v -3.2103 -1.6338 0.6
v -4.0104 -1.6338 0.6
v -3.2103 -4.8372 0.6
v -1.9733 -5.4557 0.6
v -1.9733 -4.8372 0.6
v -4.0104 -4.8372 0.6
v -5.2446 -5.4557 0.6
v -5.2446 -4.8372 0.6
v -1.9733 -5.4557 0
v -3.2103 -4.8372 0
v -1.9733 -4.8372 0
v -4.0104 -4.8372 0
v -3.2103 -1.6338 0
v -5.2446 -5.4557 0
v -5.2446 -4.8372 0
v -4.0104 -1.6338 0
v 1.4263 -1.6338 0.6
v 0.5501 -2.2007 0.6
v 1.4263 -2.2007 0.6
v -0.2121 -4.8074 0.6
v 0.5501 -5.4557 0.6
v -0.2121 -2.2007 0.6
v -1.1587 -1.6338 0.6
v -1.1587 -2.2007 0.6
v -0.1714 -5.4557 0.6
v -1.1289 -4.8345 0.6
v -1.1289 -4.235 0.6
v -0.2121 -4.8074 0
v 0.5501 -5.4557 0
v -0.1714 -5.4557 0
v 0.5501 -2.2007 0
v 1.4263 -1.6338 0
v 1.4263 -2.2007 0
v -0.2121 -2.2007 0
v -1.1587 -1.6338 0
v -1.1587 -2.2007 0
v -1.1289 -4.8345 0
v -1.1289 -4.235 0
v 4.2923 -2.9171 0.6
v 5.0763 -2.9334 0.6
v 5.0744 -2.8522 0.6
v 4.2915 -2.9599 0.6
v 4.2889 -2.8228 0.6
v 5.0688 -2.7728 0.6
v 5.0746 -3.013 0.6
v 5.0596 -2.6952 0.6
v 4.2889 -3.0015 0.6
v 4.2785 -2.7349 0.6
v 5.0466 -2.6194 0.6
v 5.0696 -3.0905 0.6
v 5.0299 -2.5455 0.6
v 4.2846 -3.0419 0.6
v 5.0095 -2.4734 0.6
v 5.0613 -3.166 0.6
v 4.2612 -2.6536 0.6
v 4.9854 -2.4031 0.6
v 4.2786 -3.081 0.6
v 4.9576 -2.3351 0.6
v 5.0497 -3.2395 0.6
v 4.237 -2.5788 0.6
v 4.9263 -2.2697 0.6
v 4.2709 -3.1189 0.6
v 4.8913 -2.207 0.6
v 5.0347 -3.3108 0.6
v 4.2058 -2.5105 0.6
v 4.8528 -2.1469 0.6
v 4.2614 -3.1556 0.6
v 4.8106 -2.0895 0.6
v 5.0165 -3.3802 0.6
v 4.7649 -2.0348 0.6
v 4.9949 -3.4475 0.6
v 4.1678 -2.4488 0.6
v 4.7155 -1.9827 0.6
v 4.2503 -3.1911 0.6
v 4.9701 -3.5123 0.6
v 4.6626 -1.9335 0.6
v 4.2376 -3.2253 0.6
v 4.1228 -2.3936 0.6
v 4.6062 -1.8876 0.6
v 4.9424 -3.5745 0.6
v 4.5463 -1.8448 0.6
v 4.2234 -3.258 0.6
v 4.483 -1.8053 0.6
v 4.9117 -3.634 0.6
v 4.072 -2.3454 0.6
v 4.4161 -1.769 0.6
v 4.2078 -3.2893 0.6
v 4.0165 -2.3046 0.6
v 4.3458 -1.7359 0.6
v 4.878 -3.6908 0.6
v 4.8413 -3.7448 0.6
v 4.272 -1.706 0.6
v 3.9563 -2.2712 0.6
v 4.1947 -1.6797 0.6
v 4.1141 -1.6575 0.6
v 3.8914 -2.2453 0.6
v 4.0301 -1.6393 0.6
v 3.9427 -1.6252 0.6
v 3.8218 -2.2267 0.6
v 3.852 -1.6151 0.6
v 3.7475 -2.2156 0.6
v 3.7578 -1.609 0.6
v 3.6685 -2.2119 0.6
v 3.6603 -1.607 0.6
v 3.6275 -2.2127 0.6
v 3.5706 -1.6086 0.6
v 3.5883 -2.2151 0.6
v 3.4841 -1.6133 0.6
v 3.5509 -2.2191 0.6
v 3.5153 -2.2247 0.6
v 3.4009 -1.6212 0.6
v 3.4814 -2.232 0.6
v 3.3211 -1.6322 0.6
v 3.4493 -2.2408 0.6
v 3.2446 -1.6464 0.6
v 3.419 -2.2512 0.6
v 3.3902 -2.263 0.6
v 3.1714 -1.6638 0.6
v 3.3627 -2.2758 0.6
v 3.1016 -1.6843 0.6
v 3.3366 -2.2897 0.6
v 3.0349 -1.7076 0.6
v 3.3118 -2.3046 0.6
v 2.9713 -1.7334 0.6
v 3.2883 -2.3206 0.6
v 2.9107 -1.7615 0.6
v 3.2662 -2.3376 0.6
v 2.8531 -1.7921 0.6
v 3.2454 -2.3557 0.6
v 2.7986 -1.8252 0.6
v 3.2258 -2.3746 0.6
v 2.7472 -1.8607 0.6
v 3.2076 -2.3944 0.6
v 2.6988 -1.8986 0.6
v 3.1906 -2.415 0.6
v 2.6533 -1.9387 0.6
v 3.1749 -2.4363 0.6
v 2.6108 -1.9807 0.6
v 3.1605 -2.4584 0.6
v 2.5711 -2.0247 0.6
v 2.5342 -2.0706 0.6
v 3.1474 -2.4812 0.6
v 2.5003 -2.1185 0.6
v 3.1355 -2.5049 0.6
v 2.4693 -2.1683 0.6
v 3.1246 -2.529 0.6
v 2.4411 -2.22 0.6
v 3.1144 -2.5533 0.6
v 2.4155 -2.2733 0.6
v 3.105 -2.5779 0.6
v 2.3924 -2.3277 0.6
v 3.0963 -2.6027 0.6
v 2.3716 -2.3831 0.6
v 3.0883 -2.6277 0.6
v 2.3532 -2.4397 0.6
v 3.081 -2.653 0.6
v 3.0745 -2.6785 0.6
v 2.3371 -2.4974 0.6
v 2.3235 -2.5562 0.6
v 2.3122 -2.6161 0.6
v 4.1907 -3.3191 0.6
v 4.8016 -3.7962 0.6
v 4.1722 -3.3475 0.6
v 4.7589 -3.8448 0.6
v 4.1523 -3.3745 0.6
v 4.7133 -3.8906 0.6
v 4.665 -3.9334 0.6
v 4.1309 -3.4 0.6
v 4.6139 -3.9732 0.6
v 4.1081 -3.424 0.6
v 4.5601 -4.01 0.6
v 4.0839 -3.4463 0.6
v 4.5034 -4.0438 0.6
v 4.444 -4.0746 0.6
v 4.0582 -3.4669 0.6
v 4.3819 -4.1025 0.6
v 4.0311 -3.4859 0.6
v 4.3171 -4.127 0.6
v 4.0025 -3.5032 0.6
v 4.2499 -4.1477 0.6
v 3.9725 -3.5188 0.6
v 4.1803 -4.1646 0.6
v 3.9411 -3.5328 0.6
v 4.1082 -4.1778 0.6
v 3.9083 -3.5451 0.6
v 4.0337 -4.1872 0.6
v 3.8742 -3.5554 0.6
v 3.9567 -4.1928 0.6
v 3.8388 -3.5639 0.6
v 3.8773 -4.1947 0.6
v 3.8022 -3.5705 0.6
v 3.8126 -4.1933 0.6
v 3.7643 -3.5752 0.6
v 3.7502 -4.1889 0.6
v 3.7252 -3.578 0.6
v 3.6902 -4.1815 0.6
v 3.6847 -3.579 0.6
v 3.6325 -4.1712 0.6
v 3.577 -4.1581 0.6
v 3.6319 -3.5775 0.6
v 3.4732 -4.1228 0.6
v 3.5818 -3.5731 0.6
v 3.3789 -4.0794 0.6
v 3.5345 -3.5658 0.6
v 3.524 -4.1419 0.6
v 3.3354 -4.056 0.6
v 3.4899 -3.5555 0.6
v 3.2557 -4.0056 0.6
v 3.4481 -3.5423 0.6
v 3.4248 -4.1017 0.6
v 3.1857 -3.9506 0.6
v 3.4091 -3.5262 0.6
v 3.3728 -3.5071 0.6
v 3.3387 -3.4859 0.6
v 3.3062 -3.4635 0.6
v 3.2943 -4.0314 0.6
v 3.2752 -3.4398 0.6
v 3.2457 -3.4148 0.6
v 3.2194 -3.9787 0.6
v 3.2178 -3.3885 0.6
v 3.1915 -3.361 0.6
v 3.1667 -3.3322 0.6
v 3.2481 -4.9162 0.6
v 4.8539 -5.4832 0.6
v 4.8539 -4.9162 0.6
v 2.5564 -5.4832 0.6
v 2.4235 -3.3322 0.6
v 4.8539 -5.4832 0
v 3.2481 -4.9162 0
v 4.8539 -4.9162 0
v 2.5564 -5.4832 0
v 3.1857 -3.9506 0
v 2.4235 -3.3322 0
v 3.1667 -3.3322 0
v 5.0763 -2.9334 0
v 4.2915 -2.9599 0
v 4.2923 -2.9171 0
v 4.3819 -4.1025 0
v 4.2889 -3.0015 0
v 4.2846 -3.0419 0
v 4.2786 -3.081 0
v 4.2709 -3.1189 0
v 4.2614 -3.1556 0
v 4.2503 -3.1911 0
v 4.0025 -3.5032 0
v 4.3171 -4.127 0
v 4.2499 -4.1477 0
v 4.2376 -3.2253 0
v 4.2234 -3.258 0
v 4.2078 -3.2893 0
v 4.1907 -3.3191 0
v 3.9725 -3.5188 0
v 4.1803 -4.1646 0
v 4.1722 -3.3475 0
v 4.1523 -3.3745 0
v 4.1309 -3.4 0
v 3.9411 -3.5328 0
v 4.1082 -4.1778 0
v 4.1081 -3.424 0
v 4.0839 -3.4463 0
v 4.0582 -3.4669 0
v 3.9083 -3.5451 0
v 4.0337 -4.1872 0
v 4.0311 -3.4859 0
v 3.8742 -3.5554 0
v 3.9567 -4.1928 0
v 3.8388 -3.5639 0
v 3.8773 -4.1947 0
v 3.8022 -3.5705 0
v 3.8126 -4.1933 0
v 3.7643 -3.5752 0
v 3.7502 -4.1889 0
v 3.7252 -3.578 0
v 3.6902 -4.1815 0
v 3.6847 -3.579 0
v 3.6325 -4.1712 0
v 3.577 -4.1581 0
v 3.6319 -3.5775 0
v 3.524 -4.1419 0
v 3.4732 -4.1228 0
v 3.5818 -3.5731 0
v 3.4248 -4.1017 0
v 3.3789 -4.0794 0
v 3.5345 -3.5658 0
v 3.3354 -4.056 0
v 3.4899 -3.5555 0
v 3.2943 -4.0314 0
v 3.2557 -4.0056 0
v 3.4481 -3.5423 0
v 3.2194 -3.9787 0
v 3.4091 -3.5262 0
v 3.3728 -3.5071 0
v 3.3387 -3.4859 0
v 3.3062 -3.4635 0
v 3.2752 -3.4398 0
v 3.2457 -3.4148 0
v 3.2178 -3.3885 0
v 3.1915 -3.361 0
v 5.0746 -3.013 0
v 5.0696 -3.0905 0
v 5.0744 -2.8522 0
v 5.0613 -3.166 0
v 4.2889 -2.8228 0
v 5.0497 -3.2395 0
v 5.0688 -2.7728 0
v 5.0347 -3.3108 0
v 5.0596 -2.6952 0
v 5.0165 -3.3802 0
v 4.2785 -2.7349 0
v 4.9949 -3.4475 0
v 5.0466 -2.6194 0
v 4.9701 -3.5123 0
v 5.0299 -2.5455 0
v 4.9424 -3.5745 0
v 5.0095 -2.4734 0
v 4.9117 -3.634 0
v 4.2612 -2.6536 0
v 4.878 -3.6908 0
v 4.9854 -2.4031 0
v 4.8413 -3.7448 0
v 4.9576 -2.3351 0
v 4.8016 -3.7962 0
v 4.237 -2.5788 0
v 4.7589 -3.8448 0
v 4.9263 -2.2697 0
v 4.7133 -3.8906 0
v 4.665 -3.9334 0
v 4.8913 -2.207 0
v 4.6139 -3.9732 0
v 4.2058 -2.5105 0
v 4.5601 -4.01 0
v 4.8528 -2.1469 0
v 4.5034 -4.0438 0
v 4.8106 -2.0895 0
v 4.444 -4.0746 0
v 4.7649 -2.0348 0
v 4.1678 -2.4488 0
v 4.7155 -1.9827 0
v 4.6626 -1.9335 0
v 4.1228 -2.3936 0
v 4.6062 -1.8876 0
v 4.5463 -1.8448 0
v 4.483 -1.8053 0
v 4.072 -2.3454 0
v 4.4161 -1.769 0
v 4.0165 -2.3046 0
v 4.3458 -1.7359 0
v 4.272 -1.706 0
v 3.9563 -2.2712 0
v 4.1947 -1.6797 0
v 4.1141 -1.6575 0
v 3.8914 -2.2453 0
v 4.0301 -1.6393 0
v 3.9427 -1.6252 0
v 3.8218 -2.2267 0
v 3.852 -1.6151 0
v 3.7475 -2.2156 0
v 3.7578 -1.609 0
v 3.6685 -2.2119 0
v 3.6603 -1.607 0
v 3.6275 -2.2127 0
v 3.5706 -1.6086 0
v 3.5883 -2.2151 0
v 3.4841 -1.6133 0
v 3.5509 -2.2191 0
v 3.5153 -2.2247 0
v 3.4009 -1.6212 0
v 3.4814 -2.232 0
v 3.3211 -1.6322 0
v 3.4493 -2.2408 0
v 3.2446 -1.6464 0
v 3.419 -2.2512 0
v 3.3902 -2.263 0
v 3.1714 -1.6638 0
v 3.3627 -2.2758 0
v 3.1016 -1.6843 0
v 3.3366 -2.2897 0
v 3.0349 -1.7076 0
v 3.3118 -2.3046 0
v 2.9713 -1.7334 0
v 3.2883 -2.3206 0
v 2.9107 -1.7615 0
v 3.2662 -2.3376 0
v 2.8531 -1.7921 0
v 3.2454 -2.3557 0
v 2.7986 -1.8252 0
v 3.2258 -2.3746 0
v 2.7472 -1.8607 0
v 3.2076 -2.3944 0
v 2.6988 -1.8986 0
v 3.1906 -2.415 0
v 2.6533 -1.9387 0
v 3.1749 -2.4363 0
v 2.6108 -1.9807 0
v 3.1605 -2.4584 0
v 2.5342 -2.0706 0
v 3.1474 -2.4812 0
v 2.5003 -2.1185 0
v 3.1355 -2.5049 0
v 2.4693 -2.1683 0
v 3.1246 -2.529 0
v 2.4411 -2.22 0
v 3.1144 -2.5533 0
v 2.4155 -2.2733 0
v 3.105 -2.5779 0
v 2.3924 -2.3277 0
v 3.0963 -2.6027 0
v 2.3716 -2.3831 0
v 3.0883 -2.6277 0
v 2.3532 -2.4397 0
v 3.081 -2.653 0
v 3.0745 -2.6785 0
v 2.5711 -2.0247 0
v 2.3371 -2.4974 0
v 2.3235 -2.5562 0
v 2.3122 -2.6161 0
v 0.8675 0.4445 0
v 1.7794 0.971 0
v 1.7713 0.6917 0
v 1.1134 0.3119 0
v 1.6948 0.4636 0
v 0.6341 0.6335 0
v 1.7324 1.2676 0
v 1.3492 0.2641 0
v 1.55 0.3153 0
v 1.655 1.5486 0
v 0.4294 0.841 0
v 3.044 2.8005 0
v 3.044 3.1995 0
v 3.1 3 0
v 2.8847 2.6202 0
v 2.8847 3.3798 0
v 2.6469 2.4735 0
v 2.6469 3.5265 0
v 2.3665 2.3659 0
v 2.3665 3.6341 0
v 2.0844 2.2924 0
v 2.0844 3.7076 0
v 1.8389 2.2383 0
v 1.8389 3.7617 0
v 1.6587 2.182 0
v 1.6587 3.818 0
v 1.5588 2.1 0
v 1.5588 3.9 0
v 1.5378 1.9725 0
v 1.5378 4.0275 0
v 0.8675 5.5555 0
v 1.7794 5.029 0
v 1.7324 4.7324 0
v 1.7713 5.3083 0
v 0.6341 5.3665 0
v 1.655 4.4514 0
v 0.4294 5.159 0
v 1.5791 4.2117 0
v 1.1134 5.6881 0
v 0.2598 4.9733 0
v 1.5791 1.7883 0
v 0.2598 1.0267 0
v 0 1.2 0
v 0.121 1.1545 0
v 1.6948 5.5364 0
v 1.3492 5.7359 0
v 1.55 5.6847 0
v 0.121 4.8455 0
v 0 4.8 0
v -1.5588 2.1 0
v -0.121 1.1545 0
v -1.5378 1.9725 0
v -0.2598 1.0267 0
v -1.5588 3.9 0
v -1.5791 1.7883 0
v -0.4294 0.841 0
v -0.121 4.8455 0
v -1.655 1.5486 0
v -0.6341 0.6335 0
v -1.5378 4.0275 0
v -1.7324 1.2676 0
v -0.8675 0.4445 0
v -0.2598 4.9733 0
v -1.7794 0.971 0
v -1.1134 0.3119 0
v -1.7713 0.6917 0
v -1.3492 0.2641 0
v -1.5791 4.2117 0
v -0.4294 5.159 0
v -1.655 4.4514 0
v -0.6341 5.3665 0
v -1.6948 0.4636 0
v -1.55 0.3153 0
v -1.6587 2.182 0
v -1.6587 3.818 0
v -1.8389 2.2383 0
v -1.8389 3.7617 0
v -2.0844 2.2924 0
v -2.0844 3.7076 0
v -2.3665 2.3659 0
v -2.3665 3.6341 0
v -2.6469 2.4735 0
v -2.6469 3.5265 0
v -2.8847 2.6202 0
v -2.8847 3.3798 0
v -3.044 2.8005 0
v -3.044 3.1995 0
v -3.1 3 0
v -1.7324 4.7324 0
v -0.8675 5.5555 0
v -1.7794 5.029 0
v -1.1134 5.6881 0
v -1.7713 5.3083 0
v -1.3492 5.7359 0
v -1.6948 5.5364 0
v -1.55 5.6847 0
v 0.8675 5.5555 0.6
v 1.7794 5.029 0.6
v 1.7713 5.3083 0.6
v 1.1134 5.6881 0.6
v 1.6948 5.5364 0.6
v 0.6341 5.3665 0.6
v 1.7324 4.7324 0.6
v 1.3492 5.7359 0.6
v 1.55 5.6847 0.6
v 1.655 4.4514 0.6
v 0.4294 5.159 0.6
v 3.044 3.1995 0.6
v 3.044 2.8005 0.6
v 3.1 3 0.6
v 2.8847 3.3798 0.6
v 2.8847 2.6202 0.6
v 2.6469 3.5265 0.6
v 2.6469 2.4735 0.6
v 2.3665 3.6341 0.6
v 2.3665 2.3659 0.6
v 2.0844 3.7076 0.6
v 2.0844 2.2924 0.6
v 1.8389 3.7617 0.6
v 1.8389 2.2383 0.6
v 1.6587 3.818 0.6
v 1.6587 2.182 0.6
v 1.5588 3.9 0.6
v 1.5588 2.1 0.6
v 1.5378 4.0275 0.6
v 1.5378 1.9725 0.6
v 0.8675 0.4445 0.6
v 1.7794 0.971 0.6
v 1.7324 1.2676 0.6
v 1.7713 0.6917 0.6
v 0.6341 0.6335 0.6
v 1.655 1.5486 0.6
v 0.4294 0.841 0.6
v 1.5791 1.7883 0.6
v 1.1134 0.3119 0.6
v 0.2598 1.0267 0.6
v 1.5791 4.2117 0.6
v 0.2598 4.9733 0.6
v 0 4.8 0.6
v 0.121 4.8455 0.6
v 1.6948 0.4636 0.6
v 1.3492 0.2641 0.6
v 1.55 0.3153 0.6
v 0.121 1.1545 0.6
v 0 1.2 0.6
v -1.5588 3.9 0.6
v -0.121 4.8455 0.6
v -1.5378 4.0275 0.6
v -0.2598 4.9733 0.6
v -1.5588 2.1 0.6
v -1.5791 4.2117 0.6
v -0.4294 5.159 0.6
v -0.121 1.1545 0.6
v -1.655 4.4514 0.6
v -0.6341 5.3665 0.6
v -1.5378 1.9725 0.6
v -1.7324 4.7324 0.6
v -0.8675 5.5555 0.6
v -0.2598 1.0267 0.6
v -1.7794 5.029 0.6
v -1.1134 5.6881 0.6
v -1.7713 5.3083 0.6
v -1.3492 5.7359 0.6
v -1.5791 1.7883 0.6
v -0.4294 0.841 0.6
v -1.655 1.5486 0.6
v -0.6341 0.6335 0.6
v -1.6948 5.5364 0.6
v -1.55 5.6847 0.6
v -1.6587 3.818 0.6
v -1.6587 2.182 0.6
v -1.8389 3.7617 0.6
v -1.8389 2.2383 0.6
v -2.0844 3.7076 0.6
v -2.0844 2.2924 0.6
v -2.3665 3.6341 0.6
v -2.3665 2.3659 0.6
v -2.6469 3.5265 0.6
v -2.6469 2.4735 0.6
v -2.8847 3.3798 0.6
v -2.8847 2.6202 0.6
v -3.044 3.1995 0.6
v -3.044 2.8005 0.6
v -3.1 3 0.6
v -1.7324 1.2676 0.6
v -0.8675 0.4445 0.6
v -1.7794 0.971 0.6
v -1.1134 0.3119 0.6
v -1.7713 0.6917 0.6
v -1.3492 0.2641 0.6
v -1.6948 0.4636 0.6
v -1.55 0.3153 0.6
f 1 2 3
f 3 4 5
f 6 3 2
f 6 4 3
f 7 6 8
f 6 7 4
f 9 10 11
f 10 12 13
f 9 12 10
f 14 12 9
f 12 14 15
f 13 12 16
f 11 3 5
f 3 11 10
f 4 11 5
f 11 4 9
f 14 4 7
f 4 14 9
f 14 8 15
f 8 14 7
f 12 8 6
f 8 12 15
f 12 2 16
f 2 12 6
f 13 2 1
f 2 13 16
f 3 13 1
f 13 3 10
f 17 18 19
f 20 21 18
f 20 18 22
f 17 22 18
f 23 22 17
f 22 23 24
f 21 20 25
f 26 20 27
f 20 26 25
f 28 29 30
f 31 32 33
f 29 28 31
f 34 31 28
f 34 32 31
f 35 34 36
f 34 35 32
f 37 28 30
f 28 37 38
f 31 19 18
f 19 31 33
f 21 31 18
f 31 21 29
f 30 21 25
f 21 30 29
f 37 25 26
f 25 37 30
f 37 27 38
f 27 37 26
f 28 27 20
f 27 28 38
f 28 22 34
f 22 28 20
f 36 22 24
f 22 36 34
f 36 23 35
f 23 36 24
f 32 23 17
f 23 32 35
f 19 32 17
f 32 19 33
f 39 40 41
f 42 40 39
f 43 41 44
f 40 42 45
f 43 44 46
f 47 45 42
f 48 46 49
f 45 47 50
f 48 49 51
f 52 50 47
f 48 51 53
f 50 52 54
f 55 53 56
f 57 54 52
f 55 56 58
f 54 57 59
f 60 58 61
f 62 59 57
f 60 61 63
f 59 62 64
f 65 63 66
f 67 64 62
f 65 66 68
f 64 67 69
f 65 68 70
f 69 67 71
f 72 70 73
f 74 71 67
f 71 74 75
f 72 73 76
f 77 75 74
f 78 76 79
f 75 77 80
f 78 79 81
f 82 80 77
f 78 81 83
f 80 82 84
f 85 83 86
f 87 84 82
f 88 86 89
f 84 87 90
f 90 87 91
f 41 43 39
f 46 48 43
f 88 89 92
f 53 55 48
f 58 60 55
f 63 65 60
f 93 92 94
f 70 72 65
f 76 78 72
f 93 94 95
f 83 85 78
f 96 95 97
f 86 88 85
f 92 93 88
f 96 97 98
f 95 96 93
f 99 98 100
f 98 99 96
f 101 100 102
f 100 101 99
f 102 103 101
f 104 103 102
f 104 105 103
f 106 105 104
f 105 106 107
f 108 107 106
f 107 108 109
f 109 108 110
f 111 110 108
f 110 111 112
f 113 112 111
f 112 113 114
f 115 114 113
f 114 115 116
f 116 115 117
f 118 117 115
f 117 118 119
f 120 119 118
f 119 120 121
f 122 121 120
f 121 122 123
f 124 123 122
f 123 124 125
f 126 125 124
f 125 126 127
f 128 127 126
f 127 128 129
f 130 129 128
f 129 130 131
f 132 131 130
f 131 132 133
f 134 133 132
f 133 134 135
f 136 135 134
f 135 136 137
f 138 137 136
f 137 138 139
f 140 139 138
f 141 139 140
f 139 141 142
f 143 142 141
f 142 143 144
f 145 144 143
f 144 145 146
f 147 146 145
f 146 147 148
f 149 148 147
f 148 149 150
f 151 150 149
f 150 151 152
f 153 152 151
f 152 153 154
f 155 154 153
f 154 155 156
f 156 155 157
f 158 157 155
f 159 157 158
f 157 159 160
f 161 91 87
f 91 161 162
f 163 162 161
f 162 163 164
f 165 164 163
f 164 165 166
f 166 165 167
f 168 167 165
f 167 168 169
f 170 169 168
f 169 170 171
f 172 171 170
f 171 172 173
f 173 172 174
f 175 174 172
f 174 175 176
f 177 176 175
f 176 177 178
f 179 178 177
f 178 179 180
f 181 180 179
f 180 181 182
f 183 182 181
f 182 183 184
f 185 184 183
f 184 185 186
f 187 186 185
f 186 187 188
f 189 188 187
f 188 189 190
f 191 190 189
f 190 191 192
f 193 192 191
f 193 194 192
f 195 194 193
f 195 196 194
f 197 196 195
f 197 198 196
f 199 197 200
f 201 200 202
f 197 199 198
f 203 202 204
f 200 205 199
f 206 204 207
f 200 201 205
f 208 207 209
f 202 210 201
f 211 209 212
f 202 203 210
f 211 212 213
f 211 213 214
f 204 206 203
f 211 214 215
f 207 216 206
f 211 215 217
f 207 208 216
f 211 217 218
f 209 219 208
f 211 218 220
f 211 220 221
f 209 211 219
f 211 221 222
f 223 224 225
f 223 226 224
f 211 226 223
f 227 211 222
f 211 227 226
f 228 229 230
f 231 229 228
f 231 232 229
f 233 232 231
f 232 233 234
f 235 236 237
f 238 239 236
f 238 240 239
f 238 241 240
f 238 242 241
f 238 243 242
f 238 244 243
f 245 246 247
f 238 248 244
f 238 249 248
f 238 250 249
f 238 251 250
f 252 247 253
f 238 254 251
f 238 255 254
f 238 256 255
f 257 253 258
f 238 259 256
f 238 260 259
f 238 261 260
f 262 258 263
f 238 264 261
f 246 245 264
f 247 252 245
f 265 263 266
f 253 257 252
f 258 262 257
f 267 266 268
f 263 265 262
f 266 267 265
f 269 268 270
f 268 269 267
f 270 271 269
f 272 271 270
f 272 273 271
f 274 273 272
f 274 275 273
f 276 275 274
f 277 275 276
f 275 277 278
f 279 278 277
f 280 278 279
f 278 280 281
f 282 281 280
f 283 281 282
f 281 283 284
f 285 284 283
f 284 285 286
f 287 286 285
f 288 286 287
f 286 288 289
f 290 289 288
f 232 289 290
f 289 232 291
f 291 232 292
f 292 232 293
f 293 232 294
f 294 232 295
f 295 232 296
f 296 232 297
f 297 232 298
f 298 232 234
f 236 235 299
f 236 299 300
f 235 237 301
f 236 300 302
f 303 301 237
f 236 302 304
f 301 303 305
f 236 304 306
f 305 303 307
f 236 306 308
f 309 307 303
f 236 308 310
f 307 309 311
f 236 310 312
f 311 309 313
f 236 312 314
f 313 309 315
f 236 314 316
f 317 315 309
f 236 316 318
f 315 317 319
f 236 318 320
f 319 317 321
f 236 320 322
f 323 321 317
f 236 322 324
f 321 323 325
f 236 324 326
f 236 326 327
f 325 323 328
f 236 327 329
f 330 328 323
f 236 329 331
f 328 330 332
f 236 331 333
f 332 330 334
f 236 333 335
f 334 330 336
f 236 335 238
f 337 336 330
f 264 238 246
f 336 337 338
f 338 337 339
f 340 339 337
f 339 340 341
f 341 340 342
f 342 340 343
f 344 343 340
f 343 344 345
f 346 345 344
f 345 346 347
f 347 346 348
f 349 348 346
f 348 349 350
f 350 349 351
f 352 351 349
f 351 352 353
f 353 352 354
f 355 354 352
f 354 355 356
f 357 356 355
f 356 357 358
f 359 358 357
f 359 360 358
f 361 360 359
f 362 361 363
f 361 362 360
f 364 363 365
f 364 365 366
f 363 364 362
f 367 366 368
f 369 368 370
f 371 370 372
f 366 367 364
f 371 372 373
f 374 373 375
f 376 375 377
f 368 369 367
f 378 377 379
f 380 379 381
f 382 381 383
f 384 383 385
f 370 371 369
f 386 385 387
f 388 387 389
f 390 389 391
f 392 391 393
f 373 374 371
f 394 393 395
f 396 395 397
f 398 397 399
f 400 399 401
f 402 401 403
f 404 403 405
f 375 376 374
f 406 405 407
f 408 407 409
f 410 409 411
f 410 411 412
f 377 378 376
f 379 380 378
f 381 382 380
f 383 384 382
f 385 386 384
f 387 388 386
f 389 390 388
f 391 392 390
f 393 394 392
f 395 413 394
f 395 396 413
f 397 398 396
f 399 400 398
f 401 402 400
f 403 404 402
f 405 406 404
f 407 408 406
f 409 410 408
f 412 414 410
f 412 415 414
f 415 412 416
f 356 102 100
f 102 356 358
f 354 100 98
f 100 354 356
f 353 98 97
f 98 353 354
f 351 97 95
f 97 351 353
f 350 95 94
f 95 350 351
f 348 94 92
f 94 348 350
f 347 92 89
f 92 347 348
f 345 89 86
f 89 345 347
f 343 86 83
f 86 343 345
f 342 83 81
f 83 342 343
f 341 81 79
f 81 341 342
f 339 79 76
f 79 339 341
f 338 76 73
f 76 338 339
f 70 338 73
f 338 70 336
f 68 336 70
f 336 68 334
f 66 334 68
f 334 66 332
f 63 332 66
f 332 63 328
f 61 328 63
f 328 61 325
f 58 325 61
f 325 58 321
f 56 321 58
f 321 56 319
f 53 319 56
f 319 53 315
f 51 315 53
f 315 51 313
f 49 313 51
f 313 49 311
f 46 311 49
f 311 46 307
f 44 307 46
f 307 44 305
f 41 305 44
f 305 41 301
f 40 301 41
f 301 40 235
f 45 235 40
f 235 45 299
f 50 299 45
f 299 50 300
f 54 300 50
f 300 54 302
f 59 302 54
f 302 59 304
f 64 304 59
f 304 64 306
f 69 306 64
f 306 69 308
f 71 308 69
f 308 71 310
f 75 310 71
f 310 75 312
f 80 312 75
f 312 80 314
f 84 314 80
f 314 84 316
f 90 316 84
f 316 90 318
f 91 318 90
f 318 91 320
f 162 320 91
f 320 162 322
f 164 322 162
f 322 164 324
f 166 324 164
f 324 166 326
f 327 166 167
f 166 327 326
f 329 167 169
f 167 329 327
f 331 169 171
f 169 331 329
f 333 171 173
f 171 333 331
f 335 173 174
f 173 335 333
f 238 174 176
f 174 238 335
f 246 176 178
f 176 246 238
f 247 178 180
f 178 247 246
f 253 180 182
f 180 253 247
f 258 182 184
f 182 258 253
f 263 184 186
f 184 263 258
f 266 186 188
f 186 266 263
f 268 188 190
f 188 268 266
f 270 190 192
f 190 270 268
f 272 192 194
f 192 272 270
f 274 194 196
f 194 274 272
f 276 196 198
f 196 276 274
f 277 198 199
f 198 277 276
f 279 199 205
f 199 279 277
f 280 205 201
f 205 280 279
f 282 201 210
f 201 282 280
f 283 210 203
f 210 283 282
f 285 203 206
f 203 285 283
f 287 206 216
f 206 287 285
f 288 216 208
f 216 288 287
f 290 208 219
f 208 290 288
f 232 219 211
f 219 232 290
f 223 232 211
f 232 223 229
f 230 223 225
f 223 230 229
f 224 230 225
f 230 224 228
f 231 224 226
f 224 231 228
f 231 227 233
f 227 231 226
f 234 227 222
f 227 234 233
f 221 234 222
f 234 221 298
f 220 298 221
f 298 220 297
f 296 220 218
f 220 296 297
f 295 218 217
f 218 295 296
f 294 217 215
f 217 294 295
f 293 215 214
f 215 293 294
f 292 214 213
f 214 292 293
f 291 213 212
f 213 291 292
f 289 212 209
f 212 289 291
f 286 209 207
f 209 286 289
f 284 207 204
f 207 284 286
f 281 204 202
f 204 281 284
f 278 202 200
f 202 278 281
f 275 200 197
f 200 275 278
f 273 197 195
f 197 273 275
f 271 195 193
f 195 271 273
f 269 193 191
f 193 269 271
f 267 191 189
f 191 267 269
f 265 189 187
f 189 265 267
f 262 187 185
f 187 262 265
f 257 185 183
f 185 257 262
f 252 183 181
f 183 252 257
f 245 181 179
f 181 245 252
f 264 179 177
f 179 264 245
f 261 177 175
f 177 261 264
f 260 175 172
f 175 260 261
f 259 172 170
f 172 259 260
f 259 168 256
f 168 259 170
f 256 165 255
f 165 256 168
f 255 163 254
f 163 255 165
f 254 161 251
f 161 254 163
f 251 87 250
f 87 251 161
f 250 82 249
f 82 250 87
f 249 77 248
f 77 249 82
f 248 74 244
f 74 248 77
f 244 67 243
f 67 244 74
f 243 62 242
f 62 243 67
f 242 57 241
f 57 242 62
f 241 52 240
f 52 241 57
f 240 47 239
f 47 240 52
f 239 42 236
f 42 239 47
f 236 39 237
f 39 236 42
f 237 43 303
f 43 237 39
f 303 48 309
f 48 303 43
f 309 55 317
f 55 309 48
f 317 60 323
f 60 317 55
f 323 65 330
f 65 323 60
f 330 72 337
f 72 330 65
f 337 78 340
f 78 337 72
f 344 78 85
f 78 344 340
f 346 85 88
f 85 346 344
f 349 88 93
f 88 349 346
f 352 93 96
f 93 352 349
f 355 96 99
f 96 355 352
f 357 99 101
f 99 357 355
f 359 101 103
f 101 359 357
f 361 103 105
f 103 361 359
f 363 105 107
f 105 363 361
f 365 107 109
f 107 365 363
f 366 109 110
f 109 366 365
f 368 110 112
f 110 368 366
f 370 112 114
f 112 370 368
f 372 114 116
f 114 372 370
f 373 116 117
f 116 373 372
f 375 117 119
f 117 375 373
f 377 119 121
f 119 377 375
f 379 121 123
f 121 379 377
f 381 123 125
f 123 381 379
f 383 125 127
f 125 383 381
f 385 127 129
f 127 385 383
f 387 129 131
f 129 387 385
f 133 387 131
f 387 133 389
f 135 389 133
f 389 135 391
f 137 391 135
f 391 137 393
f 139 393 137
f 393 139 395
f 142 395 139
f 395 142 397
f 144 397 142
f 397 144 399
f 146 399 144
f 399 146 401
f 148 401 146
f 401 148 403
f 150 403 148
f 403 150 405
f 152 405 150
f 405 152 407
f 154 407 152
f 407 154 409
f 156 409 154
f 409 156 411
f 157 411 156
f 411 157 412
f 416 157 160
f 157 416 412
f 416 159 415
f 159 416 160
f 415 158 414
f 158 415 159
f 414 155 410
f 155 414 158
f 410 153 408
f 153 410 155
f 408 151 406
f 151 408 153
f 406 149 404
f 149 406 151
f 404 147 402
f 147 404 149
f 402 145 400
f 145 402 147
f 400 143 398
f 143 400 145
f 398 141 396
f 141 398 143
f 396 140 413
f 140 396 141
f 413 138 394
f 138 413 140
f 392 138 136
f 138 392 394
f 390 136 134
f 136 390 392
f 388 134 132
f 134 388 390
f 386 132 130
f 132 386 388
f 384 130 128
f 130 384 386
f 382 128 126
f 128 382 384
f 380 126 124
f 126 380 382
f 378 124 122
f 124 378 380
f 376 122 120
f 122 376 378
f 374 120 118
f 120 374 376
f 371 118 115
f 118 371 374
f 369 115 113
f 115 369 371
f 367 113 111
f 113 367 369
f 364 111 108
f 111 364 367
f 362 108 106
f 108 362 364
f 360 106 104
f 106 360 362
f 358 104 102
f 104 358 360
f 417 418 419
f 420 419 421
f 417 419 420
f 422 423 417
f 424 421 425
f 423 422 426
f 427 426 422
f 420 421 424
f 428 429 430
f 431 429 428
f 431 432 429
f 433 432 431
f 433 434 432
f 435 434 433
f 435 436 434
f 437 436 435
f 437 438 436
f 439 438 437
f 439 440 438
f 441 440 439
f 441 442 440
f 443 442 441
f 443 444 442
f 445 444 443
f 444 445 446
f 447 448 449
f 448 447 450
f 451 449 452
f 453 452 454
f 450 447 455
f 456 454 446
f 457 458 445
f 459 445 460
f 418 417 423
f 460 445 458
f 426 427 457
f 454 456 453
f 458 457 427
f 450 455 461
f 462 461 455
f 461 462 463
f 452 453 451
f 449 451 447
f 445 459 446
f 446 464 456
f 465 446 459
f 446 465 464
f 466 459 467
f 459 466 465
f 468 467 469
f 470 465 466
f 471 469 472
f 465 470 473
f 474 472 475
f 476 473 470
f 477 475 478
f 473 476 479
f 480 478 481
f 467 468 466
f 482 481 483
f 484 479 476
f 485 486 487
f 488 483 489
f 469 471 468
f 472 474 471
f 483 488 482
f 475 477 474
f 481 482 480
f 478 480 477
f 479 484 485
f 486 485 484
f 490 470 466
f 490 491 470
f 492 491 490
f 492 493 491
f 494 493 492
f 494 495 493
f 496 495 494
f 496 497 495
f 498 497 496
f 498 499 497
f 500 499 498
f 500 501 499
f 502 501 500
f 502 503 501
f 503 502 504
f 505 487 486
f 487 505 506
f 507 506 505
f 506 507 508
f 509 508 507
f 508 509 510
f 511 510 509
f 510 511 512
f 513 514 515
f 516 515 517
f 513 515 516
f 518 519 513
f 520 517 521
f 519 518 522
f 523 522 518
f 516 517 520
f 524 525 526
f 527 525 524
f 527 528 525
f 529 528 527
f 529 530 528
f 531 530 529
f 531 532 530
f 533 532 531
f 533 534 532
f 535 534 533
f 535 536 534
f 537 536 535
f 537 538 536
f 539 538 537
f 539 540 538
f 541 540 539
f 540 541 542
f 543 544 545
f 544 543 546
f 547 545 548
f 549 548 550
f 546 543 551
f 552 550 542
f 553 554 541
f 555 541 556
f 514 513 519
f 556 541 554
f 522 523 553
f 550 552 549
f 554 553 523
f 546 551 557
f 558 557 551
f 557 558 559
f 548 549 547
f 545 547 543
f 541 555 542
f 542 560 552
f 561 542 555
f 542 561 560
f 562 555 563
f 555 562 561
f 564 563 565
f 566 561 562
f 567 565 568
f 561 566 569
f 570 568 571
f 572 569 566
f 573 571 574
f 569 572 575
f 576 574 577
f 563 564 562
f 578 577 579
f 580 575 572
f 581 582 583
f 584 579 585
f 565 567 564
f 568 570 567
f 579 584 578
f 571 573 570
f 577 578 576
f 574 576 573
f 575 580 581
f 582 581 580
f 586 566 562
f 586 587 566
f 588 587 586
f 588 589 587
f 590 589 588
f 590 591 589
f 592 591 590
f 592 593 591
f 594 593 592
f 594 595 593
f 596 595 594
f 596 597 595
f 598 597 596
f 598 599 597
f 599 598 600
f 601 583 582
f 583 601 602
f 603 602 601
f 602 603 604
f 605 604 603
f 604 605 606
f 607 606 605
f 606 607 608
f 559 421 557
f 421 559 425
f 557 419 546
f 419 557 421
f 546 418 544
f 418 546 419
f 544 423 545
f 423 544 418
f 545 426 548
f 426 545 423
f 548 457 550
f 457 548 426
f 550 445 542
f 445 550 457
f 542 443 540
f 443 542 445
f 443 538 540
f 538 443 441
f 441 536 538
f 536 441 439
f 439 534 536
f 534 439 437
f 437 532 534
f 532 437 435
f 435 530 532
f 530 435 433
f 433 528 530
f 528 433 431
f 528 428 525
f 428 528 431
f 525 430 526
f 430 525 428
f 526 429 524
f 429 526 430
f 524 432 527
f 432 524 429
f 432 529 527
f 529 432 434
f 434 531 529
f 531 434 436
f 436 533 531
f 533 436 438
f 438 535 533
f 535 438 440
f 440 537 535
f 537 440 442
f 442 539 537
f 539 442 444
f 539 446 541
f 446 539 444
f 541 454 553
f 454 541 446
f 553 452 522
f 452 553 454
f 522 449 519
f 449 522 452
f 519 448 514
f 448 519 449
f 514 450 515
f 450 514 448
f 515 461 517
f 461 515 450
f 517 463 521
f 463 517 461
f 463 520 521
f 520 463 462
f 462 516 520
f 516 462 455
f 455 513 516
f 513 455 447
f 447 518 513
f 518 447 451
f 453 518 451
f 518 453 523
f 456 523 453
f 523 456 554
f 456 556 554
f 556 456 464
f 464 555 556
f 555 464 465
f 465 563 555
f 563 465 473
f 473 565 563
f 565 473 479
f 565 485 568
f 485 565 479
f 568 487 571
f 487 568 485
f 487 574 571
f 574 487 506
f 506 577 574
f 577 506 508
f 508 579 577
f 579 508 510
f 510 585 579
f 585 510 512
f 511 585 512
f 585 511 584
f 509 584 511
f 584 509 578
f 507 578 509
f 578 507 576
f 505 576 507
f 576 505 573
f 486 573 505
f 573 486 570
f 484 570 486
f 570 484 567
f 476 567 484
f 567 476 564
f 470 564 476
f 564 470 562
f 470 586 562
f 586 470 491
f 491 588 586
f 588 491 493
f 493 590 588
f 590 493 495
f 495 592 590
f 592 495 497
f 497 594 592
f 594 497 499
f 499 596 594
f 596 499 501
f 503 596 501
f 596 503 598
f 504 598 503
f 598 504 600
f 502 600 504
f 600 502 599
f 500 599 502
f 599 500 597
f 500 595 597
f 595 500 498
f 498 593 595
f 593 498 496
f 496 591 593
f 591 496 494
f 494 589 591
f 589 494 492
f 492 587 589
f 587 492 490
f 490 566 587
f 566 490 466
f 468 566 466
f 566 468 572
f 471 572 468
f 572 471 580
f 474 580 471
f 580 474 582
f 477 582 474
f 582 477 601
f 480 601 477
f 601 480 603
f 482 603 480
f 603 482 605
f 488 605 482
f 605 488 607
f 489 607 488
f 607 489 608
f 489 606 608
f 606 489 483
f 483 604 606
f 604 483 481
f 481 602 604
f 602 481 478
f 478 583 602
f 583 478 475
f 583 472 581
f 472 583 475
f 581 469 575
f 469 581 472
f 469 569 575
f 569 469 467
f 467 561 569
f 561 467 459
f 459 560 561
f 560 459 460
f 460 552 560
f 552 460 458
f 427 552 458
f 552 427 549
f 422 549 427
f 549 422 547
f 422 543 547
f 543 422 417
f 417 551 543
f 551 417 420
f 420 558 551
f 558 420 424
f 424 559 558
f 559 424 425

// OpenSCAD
$fn = 50;

difference() {
	union() {
		translate(v = [-3.65, -3.5, 0.6]) {
			rotate(a = [180, 0, 0]) {
				linear_extrude(height = 0.6) {
					text(font = "Liberation Sans:style=Bold", halign = "center", size = 4.0, text = "T", valign = "center");
				}
			}
		}
		translate(v = [0.0, -3.5, 0.6]) {
			rotate(a = [180, 0, 0]) {
				linear_extrude(height = 0.6) {
					text(font = "Liberation Sans:style=Bold", halign = "center", size = 4.0, text = "1", valign = "center");
				}
			}
		}
		translate(v = [3.65, -3.5, 0.6]) {
			rotate(a = [180, 0, 0]) {
				linear_extrude(height = 0.6) {
					text(font = "Liberation Sans:style=Bold", halign = "center", size = 4.0, text = "5", valign = "center");
				}
			}
		}
		translate(v = [0, 3, 0]) {
			linear_extrude(height = 0.6) {
				polygon(points = [[3.1, 0.0], [3.0439902950186117, 0.1995136647114984], [2.8847272103883213, 0.3797815421059436], [2.646888617374527, 0.5264988810722369], [2.3665182744082176, 0.6341066605011758], [2.0844354103556904, 0.7075704773708675], [1.8388718910678303, 0.761685676746956], [1.658746676795018, 0.818003336606089], [1.55884572681199, 0.9], [1.5377850082788151, 1.0275150922444565], [1.5790750912955211, 1.211666933596394], [1.6549917135488983, 1.4513887792304347], [1.7324116139070416, 1.7324116139070416], [1.779405714759903, 2.0290233430980913], [1.7712640685463372, 2.3083562761315313], [1.6947790495515949, 2.5364160920036563], [1.5500000000000005, 2.68467875173176], [1.3492112454670173, 2.735929756715155], [1.1134631418419842, 2.688137818237475], [0.8674829026146248, 2.555522224170328], [0.6341066605011758, 2.3665182744082176], [0.42944369680679173, 2.1589592566013023], [0.2597967997723095, 1.9733526103433505], [0.120961668516203, 1.8455184288505457], [1.102182119232618e-16, 1.8000000000000003], [-0.12096166851620277, 1.8455184288505457], [-0.25979679977230924, 1.9733526103433503], [-0.42944369680679134, 2.158959256601302], [-0.6341066605011755, 2.366518274408217], [-0.8674829026146244, 2.555522224170328], [-1.1134631418419831, 2.688137818237475], [-1.3492112454670169, 2.735929756715155], [-1.5499999999999994, 2.68467875173176], [-1.6947790495515944, 2.536416092003656], [-1.7712640685463372, 2.3083562761315313], [-1.7794057147599032, 2.0290233430980913], [-1.7324116139070418, 1.732411613907042], [-1.6549917135488983, 1.4513887792304352], [-1.5790750912955214, 1.211666933596395], [-1.5377850082788156, 1.0275150922444576], [-1.55884572681199, 0.9], [-1.6587466767950174, 0.8180033366060897], [-1.8388718910678303, 0.7616856767469562], [-2.084435410355689, 0.7075704773708675], [-2.3665182744082154, 0.634106660501176], [-2.646888617374527, 0.5264988810722366], [-2.8847272103883204, 0.37978154210594467], [-3.0439902950186117, 0.1995136647114986], [-3.1, 3.796405077356795e-16], [-3.043990295018612, -0.19951366471149784], [-2.8847272103883213, -0.37978154210594417], [-2.646888617374528, -0.5264988810722362], [-2.366518274408217, -0.6341066605011759], [-2.0844354103556904, -0.7075704773708673], [-1.8388718910678312, -0.7616856767469561], [-1.6587466767950179, -0.8180033366060894], [-1.5588457268119902, -0.8999999999999996], [-1.5377850082788154, -1.0275150922444558], [-1.5790750912955211, -1.211666933596394], [-1.6549917135488978, -1.4513887792304343], [-1.7324116139070413, -1.7324116139070393], [-1.7794057147599032, -2.0290233430980904], [-1.7712640685463374, -2.30835627613153], [-1.6947790495515942, -2.5364160920036567], [-1.5500000000000014, -2.6846787517317594], [-1.349211245467018, -2.7359297567151555], [-1.1134631418419827, -2.688137818237474], [-0.8674829026146252, -2.5555222241703284], [-0.6341066605011755, -2.366518274408217], [-0.42944369680679256, -2.1589592566013027], [-0.2597967997723094, -1.973352610343351], [-0.12096166851620195, -1.8455184288505448], [-3.3065463576978537e-16, -1.8000000000000003], [0.12096166851620122, -1.8455184288505442], [0.2597967997723086, -1.9733526103433503], [0.4294436968067915, -2.1589592566013014], [0.6341066605011743, -2.3665182744082163], [0.8674829026146239, -2.5555222241703275], [1.1134631418419814, -2.688137818237473], [1.3492112454670167, -2.735929756715155], [1.5500000000000005, -2.68467875173176], [1.6947790495515938, -2.536416092003658], [1.7712640685463361, -2.3083562761315344], [1.7794057147599027, -2.0290233430980895], [1.732411613907041, -1.7324116139070416], [1.6549917135488992, -1.451388779230435], [1.5790750912955214, -1.2116669335963952], [1.5377850082788151, -1.0275150922444585], [1.5588457268119893, -0.9000000000000009], [1.658746676795018, -0.8180033366060894], [1.8388718910678303, -0.7616856767469555], [2.084435410355689, -0.7075704773708676], [2.366518274408215, -0.6341066605011774], [2.646888617374524, -0.5264988810722376], [2.8847272103883217, -0.37978154210594395], [3.0439902950186117, -0.1995136647114976]]);
			}
		}
	}
	union();
}
